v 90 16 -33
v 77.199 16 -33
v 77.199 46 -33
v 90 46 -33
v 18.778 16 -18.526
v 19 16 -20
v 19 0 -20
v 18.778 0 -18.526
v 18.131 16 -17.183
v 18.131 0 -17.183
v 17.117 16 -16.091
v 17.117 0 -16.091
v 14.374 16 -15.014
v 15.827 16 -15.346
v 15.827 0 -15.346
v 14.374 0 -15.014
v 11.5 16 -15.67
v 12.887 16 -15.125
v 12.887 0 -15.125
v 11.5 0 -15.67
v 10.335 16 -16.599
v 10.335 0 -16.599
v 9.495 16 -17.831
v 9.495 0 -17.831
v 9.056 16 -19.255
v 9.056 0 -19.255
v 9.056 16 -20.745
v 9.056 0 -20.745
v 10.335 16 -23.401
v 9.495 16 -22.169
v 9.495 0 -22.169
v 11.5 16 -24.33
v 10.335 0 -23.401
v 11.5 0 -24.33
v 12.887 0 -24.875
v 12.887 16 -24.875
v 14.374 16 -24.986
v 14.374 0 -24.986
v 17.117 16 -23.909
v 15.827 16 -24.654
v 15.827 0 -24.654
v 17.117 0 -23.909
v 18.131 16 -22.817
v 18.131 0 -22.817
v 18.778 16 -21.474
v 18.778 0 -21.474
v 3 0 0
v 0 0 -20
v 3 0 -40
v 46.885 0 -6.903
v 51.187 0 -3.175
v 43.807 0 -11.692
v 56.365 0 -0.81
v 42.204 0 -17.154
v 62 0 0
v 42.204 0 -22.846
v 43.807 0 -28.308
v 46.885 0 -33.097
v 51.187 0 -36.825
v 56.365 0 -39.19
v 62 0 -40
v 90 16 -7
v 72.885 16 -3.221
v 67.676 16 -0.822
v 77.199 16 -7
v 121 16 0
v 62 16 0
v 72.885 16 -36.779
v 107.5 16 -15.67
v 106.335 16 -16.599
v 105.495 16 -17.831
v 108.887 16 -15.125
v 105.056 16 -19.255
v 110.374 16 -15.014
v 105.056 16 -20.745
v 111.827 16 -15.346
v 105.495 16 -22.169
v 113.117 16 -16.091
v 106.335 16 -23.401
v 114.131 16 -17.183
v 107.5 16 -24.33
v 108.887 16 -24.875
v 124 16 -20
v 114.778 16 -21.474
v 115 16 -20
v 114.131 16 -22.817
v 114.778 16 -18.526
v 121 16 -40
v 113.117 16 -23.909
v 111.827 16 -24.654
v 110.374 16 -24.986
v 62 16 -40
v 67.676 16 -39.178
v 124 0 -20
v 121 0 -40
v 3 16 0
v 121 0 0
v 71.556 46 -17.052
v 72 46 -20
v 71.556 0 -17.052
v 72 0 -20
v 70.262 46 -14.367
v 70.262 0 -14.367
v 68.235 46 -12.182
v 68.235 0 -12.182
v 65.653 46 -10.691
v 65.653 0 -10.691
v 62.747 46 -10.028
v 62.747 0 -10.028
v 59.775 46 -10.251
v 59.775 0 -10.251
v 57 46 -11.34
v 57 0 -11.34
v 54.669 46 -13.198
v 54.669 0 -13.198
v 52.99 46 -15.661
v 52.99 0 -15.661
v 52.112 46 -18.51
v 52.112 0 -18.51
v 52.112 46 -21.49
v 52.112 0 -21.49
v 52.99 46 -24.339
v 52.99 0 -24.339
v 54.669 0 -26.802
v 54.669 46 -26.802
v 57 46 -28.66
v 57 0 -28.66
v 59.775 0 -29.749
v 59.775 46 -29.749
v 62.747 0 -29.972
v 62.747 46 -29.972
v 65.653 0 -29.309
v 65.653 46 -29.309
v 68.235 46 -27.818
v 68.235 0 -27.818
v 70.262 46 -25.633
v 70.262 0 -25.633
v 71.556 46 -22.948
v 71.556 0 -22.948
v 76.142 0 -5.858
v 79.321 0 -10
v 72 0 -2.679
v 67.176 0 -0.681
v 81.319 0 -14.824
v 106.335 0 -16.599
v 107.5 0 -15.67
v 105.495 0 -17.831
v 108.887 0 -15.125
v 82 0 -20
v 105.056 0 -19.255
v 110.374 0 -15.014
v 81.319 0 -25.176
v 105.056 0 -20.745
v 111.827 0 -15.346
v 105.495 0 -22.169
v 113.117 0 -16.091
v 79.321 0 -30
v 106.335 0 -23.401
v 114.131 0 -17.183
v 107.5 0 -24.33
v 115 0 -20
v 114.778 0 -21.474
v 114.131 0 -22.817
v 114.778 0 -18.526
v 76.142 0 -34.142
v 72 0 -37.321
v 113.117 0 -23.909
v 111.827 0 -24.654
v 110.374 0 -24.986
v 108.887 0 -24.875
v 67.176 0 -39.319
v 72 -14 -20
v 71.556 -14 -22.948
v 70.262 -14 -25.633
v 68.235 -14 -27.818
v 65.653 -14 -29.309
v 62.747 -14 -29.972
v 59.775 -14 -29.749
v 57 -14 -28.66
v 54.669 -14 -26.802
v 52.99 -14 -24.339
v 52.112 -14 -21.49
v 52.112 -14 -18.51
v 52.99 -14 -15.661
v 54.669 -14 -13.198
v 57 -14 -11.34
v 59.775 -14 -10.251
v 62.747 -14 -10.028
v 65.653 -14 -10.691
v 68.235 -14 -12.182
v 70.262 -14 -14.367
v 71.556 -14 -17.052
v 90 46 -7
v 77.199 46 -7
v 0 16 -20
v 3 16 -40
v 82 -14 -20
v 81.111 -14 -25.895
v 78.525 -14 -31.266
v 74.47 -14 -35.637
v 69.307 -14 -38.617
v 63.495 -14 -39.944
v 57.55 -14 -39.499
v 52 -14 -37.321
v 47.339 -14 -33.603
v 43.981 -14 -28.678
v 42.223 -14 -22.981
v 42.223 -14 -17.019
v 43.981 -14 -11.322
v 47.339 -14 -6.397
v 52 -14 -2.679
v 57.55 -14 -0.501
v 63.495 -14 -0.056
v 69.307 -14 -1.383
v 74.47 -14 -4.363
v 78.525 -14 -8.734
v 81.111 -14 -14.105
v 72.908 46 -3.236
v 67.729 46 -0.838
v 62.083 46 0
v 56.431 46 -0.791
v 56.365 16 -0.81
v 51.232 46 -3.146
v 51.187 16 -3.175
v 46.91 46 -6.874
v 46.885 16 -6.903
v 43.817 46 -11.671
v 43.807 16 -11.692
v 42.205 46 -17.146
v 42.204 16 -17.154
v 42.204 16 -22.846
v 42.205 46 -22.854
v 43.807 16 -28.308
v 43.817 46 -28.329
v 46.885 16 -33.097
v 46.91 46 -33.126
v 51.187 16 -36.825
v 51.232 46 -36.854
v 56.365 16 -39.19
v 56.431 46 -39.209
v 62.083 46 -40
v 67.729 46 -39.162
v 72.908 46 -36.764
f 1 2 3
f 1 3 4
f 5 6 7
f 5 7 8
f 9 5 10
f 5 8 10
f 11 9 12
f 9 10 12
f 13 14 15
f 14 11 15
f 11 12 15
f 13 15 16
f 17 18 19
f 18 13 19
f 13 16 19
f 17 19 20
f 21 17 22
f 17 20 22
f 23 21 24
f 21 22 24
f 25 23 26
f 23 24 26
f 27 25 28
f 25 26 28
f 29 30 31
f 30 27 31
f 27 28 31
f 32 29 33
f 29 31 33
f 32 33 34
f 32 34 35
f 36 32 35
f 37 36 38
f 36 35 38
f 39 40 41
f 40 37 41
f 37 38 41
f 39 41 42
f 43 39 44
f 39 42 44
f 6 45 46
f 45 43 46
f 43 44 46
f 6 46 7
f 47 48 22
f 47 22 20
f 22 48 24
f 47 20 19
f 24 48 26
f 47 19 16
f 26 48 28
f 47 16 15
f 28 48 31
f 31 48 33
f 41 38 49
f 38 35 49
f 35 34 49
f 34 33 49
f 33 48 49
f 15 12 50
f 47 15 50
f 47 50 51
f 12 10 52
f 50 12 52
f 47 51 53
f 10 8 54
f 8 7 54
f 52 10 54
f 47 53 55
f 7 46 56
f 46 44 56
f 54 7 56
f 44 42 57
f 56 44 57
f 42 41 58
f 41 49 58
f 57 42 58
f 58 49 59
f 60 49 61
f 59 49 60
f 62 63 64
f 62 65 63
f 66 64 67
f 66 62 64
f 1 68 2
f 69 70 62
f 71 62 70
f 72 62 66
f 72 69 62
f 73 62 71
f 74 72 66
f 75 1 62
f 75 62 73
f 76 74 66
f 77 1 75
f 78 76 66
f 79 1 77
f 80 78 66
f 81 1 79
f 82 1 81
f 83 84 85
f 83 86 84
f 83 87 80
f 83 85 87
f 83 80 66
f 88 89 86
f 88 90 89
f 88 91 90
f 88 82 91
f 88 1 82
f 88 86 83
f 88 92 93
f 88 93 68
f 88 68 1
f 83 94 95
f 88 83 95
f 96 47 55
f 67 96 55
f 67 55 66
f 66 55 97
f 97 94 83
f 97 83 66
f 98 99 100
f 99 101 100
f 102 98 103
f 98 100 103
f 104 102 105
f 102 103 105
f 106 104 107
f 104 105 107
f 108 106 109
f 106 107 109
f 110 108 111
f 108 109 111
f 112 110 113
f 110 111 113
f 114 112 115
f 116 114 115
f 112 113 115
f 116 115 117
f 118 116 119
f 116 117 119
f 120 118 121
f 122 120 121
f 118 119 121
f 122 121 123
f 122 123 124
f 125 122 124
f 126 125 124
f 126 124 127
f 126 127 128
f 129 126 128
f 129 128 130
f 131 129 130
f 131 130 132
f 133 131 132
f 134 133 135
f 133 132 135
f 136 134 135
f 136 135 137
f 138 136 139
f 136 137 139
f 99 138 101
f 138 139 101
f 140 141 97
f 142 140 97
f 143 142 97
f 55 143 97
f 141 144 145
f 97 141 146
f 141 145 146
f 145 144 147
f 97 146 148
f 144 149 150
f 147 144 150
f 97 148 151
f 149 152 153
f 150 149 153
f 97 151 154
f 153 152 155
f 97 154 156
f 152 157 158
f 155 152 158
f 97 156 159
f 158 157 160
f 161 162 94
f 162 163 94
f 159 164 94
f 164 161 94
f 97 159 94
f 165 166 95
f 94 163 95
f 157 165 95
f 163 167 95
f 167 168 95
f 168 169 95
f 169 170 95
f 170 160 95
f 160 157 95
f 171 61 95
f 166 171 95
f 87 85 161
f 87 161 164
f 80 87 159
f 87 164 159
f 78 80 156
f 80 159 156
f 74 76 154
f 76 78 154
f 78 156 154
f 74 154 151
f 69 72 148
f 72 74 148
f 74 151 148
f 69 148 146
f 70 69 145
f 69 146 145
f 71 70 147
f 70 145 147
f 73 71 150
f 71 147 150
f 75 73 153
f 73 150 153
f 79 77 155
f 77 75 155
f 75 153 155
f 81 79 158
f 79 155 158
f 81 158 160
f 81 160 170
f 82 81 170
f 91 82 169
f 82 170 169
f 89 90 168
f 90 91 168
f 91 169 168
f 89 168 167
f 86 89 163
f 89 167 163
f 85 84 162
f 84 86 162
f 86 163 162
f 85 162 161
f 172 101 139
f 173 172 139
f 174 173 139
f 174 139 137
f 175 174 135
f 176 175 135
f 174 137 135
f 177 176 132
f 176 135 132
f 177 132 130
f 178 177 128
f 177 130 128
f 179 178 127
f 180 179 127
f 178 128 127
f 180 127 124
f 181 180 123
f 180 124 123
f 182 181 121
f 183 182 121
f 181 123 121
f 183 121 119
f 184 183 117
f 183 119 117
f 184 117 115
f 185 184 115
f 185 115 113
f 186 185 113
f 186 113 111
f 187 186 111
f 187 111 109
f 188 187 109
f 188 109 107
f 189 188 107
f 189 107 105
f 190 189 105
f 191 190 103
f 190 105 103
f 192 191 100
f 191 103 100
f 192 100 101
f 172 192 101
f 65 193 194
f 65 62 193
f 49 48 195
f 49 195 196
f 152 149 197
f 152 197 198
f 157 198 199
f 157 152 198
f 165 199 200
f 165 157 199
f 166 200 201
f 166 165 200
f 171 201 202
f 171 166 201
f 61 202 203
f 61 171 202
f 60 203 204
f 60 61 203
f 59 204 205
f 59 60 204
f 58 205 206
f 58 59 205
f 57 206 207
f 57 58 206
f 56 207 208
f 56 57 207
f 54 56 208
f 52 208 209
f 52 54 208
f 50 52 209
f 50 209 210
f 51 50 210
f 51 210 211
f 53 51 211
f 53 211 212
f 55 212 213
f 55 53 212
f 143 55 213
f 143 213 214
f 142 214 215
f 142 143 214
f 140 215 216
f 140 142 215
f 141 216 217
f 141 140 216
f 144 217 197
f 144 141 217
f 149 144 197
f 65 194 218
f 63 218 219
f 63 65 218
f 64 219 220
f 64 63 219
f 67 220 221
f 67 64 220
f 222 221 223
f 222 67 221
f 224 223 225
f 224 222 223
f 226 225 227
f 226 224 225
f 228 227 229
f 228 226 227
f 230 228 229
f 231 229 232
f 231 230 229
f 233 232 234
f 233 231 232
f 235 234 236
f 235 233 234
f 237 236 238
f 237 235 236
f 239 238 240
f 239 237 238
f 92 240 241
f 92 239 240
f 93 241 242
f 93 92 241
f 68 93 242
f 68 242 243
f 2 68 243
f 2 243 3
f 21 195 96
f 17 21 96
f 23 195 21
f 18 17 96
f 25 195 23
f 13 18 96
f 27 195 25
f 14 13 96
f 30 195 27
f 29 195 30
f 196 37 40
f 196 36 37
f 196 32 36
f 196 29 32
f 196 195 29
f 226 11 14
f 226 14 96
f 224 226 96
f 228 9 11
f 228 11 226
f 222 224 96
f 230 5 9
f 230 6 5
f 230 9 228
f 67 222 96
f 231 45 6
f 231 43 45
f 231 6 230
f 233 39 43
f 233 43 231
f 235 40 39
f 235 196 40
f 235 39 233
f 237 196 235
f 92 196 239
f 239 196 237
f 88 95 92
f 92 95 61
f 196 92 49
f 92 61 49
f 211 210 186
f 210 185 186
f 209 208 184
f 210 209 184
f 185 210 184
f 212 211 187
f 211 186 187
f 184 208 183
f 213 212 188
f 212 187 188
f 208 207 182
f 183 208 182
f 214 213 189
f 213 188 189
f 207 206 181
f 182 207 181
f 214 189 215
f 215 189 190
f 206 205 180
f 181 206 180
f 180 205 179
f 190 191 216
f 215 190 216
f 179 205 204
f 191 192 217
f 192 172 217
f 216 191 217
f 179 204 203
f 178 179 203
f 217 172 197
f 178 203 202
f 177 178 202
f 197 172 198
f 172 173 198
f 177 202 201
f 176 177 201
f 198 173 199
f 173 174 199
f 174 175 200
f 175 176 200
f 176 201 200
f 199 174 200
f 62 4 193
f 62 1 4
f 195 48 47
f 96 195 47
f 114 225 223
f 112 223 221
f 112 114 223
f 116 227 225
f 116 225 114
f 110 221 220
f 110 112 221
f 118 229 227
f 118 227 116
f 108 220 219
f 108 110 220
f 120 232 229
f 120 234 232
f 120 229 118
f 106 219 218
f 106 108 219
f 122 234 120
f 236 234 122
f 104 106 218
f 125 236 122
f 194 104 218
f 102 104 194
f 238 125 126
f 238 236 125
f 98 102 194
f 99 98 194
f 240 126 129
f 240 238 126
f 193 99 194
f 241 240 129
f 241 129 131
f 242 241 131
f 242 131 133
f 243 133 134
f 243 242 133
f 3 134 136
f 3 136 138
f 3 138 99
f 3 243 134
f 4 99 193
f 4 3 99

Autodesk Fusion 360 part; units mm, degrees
sketch "Sketch1" plane through (0, 0, 0) normal (0, 1, 0) x (1, 0, 0)
  line L0 (0, 0) -> (124, 0)
  line L1 (124, 0) -> (124, 40)
  line L2 (124, 40) -> (0, 40)
  line L3 (0, 40) -> (0, 0)
  circle A0 centre (14, 20) radius 5
  circle A1 centre (110, 20) radius 5
  line L4 (0, 20) -> (3, 0)
  line L5 (0, 20) -> (3, 40)
  line L6 (124, 20) -> (121, 0)
  line L7 (124, 20) -> (121, 40)
  circle A2 centre (62, 20) radius 20
  circle A3 centre (62, 20) radius 10
  line L8 (62, 33) -> (90, 33)
  line L9 (90, 33) -> (90, 7)
  line L10 (90, 7) -> (62, 7)
  line L11 (62, 7) -> (62, 33)
  dimension "d1" = 124
  dimension "d2" = 40
  dimension "d3" = 14
  dimension "d4" = 14
  dimension "d5" = 3
  dimension "d6" = 3
  dimension "d7" = 3
  dimension "d8" = 3
  dimension "d9" = 40
  dimension "d10" = 62
  dimension "d11" = 20
  dimension "d12" = 28
  dimension "d13" = 26
  dimension "d14" = 13
  dimension "d15" = 28
extrude "Extrude1" add sketch "Sketch1" along normal blind 16 contours L0 L2 L4 L5 A2 | L0 L2 L6 L7 A2 L8 L9 L10
extrude "Extrude2" add sketch "Sketch1" along normal blind 46 contours A2 A3 L8 L10 L11 | A2 A3 L8 L10 L11 | A2 L8 L9 L10
extrude "Extrude3" add sketch "Sketch1" against normal blind 14 contours A2 A3 L8 L10 L11 | A2 A3 L8 L10 L11
equation "d10 = ( 124 / 2 ) * 1 mm"
